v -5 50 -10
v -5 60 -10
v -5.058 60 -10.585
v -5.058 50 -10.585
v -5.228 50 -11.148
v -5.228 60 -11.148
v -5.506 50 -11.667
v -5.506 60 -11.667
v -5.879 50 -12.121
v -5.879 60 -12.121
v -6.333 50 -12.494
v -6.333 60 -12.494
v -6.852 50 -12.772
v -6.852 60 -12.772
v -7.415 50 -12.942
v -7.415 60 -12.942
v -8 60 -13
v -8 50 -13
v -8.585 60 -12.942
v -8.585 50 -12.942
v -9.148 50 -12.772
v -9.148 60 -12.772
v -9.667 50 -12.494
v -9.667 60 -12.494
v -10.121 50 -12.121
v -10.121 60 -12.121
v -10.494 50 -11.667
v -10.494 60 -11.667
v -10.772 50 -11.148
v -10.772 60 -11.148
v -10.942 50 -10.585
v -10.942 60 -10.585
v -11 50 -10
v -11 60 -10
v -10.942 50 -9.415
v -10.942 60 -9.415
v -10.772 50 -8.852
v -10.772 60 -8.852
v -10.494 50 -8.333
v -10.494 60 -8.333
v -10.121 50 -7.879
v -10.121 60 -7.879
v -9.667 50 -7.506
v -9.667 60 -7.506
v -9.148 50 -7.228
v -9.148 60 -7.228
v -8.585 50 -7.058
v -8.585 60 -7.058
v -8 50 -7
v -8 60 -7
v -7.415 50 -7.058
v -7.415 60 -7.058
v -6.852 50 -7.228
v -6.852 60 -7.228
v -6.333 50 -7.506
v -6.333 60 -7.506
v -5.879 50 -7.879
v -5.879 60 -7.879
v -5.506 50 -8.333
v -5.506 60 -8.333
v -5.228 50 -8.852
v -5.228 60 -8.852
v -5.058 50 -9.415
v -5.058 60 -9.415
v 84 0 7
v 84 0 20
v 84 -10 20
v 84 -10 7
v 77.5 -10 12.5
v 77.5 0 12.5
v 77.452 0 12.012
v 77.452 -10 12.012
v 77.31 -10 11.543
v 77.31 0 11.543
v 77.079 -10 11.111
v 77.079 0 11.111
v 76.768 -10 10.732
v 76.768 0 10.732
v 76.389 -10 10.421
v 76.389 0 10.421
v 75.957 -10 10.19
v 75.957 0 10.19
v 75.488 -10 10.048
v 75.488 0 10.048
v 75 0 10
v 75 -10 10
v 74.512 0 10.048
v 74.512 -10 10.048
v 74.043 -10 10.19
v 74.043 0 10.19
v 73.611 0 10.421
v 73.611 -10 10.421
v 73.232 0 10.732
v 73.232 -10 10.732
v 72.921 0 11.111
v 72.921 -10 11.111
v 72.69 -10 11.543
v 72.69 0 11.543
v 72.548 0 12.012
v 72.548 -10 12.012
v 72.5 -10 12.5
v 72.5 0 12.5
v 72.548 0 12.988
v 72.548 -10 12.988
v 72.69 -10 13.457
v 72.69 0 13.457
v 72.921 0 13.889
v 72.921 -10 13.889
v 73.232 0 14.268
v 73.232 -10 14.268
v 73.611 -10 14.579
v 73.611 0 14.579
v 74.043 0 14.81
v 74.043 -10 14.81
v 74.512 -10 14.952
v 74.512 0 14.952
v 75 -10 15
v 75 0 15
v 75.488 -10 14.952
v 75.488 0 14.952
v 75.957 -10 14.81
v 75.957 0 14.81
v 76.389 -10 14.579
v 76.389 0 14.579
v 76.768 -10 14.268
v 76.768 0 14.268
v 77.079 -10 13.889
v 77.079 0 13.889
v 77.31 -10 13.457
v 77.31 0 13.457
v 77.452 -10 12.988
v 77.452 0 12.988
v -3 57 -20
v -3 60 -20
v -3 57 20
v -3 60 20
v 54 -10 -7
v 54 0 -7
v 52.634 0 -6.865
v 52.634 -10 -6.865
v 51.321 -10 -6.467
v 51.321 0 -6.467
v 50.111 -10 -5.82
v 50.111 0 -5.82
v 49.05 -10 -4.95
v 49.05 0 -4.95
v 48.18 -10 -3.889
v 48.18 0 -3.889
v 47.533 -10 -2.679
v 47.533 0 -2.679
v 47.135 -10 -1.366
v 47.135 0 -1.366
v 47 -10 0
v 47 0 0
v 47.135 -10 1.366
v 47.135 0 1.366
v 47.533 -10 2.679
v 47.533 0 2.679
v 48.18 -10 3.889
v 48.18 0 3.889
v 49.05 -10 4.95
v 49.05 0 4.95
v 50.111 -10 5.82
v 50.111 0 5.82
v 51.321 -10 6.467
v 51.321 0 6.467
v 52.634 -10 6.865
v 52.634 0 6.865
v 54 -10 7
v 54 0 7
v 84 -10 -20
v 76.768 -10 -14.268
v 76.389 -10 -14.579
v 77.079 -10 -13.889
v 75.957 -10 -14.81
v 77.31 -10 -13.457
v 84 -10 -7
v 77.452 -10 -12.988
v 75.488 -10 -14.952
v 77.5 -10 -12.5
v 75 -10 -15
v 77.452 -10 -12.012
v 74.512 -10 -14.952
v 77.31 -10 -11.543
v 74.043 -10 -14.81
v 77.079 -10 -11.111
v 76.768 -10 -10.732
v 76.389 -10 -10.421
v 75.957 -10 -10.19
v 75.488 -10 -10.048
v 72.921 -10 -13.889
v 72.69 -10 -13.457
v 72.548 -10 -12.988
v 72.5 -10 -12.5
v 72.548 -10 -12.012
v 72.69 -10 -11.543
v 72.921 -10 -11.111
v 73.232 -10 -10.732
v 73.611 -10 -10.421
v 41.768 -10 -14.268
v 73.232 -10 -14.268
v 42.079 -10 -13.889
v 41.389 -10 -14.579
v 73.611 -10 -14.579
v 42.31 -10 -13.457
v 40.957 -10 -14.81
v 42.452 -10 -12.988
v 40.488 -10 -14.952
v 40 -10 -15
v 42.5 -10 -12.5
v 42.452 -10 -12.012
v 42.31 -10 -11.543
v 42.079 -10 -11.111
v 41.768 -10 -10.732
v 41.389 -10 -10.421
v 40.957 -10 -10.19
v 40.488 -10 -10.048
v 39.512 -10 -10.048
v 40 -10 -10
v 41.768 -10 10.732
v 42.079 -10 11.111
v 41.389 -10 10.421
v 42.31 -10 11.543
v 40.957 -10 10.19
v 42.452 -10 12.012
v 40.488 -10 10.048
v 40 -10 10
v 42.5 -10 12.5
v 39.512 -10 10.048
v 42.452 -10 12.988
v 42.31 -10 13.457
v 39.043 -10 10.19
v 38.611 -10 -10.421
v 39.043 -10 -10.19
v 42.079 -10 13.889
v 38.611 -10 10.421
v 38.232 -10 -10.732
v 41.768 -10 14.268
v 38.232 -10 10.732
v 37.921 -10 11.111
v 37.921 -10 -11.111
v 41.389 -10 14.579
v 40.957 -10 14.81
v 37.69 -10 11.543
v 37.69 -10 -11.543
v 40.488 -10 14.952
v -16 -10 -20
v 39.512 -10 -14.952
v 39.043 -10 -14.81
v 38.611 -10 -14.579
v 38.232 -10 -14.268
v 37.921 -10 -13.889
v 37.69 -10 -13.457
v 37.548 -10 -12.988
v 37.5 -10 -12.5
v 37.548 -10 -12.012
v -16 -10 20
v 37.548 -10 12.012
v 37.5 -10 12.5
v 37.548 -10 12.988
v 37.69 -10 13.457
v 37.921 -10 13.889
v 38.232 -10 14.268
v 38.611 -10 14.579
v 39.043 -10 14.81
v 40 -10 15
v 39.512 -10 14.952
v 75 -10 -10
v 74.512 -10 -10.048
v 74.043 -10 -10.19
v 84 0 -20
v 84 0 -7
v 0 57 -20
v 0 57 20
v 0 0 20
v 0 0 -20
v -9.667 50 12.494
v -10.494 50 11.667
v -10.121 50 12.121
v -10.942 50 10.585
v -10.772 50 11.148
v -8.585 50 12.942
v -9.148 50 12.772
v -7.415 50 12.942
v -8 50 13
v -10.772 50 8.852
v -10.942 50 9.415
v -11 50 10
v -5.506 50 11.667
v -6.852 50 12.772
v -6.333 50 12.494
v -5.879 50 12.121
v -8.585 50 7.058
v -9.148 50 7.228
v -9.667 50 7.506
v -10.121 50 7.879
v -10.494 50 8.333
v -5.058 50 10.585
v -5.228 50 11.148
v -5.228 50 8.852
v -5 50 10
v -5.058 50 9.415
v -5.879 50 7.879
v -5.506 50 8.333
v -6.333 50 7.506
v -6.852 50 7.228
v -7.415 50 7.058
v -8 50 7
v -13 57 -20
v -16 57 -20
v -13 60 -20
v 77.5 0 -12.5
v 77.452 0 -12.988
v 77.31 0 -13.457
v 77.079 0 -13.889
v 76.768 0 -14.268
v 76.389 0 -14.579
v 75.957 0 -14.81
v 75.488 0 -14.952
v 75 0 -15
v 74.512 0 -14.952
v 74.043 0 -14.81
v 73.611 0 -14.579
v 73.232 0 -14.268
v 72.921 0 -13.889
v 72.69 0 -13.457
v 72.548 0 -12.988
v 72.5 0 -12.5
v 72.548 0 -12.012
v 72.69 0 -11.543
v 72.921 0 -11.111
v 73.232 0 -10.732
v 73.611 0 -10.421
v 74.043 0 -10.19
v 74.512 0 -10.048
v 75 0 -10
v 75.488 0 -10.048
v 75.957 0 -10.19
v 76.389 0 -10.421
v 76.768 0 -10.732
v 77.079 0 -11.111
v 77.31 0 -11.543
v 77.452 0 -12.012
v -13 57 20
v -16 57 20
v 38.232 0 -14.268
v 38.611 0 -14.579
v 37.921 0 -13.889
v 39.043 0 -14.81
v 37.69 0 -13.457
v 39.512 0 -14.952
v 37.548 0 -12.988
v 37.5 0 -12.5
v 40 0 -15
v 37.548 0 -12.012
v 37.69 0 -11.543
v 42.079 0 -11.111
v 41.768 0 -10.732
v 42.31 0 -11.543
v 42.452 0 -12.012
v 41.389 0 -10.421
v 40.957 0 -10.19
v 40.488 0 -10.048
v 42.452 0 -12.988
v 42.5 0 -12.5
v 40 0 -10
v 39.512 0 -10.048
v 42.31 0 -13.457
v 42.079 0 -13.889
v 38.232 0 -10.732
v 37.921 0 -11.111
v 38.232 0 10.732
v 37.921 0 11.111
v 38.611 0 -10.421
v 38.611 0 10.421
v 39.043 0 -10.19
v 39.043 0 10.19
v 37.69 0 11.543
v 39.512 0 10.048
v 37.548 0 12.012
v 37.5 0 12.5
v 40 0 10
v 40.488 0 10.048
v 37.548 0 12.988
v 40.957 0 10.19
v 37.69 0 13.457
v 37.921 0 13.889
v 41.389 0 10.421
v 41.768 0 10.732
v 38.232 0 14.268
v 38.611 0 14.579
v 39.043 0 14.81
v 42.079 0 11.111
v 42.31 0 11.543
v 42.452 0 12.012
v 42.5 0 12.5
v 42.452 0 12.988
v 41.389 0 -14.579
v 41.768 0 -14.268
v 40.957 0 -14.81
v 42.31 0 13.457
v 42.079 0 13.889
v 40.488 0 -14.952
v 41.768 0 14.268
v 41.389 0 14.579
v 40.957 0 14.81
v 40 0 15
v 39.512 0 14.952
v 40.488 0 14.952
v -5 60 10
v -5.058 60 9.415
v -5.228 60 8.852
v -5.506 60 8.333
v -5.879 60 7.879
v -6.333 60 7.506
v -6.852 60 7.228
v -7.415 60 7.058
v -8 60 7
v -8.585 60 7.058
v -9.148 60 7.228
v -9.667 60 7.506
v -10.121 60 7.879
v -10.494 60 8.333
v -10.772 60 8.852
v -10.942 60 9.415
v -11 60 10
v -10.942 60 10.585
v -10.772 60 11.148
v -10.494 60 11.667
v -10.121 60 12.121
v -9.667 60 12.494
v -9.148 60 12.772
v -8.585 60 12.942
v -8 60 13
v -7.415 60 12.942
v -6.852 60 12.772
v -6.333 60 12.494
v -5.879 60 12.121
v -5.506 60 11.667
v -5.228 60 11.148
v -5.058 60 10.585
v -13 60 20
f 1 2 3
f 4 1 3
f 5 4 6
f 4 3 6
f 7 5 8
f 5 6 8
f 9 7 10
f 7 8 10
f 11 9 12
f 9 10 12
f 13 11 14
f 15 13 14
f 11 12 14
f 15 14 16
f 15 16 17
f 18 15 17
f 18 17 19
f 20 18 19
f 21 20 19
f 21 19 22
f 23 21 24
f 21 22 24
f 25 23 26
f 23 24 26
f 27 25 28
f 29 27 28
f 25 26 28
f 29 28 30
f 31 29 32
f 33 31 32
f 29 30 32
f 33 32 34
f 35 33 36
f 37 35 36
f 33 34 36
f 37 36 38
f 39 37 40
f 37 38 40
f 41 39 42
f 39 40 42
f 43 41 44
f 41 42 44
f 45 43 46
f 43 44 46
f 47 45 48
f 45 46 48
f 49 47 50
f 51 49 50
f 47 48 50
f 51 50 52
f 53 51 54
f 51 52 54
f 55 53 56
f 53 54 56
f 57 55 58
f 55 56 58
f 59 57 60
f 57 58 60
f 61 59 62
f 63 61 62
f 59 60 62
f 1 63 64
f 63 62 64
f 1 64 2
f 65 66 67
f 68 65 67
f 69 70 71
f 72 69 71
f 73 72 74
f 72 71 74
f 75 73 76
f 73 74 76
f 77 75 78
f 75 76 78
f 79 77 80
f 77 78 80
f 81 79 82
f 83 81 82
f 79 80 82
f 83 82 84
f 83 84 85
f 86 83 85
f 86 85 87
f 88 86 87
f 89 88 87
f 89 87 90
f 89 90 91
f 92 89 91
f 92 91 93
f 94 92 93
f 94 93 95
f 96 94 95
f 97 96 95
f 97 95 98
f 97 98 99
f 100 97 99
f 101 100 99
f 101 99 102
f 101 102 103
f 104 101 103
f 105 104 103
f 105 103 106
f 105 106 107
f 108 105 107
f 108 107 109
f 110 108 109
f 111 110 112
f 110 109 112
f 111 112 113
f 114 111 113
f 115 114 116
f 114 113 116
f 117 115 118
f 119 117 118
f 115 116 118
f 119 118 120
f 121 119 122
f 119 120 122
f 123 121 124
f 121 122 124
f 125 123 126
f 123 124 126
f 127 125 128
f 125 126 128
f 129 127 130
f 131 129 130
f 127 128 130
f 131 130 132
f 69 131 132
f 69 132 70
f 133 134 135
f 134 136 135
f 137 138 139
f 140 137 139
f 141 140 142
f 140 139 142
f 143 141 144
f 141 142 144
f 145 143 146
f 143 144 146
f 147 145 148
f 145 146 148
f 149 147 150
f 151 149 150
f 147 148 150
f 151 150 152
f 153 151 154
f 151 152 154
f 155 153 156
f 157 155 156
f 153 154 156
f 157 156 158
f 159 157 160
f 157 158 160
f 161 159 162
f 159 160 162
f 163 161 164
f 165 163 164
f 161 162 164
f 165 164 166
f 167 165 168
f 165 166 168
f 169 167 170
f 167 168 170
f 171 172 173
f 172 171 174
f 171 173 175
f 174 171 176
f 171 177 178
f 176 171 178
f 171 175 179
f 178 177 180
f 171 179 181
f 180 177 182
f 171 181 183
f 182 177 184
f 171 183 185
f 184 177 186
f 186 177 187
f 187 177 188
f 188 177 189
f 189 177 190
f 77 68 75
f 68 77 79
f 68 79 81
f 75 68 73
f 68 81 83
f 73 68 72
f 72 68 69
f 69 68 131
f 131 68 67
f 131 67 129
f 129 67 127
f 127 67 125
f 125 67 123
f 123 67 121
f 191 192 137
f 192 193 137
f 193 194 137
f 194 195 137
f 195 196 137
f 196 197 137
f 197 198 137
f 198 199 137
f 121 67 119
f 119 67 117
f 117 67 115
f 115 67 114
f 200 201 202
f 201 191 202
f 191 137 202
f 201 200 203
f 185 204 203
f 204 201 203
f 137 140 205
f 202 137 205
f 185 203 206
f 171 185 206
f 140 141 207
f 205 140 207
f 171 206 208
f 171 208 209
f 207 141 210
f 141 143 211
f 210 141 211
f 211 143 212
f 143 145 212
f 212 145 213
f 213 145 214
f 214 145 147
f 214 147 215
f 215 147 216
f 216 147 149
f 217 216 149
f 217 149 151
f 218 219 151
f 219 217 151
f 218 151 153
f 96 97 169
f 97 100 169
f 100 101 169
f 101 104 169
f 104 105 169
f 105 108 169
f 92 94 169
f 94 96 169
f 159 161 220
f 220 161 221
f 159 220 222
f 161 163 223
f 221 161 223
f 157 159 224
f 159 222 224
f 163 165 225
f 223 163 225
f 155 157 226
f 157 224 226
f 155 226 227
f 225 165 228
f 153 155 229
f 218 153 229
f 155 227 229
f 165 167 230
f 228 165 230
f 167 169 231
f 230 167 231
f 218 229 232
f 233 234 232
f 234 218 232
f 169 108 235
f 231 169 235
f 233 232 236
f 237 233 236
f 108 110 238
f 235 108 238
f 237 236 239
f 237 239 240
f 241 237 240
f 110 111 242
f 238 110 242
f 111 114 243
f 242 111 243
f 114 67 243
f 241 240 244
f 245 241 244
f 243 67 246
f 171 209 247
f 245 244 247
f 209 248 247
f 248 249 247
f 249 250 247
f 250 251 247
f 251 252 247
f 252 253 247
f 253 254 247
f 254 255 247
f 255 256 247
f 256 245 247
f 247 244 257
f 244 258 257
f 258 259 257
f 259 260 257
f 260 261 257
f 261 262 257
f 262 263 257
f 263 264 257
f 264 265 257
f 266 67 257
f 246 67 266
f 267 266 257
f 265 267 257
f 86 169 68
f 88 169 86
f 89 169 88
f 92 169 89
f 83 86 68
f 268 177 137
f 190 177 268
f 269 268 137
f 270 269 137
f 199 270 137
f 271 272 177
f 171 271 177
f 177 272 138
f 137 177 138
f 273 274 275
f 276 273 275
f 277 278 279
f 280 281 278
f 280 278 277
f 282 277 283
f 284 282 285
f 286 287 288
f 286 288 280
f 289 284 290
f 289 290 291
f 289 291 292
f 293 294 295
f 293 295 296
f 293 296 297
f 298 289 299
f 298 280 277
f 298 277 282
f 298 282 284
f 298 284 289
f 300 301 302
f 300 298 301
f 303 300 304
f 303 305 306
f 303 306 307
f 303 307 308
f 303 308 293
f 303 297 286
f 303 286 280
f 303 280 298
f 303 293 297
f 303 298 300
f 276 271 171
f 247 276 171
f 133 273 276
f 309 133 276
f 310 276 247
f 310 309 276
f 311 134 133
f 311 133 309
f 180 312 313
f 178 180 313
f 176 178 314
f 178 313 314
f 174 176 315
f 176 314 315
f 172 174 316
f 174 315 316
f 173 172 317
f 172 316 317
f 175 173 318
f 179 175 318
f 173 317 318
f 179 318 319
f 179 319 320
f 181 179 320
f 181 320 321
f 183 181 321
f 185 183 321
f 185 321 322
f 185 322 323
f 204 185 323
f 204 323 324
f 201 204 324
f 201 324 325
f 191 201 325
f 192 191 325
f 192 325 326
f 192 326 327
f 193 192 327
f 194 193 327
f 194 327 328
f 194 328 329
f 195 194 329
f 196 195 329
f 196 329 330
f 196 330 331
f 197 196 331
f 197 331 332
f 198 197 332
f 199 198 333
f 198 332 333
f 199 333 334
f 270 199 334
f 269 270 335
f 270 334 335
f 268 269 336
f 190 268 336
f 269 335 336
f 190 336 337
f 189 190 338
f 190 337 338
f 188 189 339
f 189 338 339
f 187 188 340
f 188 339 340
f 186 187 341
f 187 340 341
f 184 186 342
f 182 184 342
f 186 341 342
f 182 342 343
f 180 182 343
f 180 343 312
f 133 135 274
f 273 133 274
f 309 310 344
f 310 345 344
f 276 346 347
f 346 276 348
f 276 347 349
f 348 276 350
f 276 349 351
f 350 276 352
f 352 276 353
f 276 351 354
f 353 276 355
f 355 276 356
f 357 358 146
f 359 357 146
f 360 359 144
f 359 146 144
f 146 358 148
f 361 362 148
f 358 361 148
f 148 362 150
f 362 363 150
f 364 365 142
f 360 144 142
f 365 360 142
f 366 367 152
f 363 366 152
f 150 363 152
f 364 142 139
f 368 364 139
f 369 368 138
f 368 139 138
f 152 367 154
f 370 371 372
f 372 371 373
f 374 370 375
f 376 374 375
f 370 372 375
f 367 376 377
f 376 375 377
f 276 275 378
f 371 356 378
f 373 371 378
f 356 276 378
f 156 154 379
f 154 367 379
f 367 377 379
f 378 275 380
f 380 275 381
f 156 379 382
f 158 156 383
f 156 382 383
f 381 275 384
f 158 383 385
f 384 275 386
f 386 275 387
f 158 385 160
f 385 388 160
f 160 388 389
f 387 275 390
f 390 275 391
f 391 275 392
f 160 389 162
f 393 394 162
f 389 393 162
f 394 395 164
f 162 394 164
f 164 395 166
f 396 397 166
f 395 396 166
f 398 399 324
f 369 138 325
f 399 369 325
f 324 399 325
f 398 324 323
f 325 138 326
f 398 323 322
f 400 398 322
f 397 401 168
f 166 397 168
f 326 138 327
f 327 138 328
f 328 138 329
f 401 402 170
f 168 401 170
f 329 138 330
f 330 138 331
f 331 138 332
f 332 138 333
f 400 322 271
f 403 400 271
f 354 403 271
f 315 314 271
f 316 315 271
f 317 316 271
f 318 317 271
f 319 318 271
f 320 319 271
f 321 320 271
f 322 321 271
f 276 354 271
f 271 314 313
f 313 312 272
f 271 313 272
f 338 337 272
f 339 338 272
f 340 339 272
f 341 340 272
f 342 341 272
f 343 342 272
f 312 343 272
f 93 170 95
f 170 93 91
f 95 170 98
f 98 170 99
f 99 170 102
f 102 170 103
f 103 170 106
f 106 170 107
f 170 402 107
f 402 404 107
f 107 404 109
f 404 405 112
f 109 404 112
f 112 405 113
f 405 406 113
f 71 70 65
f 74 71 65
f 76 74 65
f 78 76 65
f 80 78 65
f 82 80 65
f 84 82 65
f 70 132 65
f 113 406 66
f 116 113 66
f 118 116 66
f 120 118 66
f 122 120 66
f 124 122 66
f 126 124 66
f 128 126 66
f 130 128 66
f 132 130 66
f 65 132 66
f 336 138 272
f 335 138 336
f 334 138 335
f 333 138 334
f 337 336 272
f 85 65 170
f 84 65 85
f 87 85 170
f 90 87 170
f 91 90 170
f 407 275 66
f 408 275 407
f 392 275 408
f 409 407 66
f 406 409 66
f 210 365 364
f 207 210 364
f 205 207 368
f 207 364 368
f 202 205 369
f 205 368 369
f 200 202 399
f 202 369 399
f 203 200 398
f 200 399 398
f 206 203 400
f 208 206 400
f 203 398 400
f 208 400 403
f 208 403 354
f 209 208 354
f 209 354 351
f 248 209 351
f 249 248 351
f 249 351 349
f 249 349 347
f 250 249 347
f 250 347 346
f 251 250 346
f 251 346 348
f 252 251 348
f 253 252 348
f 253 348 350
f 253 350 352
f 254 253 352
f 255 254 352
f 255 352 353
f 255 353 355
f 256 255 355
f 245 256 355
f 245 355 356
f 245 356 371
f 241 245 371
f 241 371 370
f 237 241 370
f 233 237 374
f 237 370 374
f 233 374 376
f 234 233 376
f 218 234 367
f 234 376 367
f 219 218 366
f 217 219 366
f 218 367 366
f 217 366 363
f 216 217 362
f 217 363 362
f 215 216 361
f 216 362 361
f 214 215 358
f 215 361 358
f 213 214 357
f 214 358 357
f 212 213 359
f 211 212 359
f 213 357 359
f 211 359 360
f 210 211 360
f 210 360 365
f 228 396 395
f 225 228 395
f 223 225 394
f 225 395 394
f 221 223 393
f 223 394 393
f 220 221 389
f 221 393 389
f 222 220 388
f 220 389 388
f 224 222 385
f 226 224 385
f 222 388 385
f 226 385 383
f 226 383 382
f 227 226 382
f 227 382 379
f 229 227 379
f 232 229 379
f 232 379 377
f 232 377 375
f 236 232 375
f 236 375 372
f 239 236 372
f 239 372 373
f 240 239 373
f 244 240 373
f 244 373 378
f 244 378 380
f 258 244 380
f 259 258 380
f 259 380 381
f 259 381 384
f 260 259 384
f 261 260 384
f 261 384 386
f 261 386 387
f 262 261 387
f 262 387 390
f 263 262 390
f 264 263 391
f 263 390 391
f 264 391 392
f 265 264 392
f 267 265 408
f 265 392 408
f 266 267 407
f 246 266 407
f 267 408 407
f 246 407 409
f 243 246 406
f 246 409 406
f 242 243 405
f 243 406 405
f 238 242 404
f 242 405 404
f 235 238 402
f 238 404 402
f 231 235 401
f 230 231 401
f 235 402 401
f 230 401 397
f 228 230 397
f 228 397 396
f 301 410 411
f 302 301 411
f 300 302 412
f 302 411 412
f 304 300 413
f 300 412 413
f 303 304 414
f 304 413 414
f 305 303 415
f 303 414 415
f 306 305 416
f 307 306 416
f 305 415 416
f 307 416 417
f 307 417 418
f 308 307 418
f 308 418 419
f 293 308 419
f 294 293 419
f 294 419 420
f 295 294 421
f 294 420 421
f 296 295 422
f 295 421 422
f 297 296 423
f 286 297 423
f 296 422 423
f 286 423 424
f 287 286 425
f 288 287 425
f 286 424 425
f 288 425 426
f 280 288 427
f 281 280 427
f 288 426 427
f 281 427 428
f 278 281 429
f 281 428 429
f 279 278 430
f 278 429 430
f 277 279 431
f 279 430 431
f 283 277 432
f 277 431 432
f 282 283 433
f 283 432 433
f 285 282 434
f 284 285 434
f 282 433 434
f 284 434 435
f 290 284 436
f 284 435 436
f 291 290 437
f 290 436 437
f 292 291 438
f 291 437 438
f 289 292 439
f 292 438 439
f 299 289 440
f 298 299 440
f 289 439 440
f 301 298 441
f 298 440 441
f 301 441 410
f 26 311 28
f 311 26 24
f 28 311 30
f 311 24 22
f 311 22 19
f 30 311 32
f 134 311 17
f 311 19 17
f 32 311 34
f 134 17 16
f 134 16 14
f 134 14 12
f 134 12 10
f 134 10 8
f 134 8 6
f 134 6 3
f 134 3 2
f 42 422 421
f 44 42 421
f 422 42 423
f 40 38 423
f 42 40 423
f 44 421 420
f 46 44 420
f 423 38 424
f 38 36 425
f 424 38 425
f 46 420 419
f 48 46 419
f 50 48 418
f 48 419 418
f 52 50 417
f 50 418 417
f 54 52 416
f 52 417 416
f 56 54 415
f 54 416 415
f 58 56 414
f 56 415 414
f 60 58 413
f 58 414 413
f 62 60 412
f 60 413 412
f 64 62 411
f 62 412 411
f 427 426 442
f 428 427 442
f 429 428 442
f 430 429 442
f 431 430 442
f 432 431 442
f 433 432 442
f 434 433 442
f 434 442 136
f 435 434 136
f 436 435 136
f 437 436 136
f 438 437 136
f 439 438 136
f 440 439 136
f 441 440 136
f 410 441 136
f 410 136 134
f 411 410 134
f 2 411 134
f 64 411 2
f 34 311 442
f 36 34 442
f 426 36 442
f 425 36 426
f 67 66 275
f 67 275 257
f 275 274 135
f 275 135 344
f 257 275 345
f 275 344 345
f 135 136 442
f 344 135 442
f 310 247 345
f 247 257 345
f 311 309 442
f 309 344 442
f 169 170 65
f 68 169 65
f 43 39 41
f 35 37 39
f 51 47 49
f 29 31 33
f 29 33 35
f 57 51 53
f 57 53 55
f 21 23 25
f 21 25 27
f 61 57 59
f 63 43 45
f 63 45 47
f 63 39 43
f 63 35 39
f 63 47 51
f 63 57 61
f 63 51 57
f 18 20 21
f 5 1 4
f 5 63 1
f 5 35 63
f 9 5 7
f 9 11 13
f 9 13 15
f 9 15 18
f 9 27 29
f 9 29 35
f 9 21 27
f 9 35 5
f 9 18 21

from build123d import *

# Parameters (mm, degrees)
EXTRUDE_1_DEPTH     = 20
SKETCH_4_R          = 3
CUT_EXTRUDE_1_DEPTH = 10
SKETCH_5_R          = 2.5
CUT_EXTRUDE_2_DEPTH = 11


with BuildPart() as part:
    # 草圖1 → 填料-伸長1 (new body, symmetric)
    with BuildSketch(Plane.XY):
        Polygon((0, 0), (84, 0), (84, -10), (-16, -10), (-16, 57), (-13, 57), (-13, 60), (-3, 60), (-3, 57), (0, 57), align=None)
    extrude(amount=EXTRUDE_1_DEPTH, both=True)

    # 草圖4 → 除料-伸長1 (cut)
    with BuildSketch(Plane(origin=(0, 60, 0), x_dir=(1, 0, 0), z_dir=(0, 1, 0))):
        with Locations((-8, 10)):
            Circle(SKETCH_4_R)
        with Locations((-8, -10)):
            Circle(SKETCH_4_R)
    extrude(amount=-CUT_EXTRUDE_1_DEPTH, mode=Mode.SUBTRACT)

    # 草圖5 → 除料-伸長2 (cut, through all)
    with BuildSketch(Plane(origin=(0, 0, 0), x_dir=(1, 0, 0), z_dir=(0, 1, 0))):
        with Locations((40, -12.5)):
            Circle(SKETCH_5_R)
        with Locations((40, 12.5)):
            Circle(SKETCH_5_R)
        with Locations((75, 12.5)):
            Circle(SKETCH_5_R)
        with Locations((75, -12.5)):
            Circle(SKETCH_5_R)
        with BuildLine():
            Line((84, 7), (54, 7))
            ThreePointArc((54, 7), (47, 0), (54, -7))
            Line((54, -7), (84, -7))
            Line((84, -7), (84, 7))
        make_face()
    extrude(amount=-CUT_EXTRUDE_2_DEPTH, mode=Mode.SUBTRACT)


solid = part.part
